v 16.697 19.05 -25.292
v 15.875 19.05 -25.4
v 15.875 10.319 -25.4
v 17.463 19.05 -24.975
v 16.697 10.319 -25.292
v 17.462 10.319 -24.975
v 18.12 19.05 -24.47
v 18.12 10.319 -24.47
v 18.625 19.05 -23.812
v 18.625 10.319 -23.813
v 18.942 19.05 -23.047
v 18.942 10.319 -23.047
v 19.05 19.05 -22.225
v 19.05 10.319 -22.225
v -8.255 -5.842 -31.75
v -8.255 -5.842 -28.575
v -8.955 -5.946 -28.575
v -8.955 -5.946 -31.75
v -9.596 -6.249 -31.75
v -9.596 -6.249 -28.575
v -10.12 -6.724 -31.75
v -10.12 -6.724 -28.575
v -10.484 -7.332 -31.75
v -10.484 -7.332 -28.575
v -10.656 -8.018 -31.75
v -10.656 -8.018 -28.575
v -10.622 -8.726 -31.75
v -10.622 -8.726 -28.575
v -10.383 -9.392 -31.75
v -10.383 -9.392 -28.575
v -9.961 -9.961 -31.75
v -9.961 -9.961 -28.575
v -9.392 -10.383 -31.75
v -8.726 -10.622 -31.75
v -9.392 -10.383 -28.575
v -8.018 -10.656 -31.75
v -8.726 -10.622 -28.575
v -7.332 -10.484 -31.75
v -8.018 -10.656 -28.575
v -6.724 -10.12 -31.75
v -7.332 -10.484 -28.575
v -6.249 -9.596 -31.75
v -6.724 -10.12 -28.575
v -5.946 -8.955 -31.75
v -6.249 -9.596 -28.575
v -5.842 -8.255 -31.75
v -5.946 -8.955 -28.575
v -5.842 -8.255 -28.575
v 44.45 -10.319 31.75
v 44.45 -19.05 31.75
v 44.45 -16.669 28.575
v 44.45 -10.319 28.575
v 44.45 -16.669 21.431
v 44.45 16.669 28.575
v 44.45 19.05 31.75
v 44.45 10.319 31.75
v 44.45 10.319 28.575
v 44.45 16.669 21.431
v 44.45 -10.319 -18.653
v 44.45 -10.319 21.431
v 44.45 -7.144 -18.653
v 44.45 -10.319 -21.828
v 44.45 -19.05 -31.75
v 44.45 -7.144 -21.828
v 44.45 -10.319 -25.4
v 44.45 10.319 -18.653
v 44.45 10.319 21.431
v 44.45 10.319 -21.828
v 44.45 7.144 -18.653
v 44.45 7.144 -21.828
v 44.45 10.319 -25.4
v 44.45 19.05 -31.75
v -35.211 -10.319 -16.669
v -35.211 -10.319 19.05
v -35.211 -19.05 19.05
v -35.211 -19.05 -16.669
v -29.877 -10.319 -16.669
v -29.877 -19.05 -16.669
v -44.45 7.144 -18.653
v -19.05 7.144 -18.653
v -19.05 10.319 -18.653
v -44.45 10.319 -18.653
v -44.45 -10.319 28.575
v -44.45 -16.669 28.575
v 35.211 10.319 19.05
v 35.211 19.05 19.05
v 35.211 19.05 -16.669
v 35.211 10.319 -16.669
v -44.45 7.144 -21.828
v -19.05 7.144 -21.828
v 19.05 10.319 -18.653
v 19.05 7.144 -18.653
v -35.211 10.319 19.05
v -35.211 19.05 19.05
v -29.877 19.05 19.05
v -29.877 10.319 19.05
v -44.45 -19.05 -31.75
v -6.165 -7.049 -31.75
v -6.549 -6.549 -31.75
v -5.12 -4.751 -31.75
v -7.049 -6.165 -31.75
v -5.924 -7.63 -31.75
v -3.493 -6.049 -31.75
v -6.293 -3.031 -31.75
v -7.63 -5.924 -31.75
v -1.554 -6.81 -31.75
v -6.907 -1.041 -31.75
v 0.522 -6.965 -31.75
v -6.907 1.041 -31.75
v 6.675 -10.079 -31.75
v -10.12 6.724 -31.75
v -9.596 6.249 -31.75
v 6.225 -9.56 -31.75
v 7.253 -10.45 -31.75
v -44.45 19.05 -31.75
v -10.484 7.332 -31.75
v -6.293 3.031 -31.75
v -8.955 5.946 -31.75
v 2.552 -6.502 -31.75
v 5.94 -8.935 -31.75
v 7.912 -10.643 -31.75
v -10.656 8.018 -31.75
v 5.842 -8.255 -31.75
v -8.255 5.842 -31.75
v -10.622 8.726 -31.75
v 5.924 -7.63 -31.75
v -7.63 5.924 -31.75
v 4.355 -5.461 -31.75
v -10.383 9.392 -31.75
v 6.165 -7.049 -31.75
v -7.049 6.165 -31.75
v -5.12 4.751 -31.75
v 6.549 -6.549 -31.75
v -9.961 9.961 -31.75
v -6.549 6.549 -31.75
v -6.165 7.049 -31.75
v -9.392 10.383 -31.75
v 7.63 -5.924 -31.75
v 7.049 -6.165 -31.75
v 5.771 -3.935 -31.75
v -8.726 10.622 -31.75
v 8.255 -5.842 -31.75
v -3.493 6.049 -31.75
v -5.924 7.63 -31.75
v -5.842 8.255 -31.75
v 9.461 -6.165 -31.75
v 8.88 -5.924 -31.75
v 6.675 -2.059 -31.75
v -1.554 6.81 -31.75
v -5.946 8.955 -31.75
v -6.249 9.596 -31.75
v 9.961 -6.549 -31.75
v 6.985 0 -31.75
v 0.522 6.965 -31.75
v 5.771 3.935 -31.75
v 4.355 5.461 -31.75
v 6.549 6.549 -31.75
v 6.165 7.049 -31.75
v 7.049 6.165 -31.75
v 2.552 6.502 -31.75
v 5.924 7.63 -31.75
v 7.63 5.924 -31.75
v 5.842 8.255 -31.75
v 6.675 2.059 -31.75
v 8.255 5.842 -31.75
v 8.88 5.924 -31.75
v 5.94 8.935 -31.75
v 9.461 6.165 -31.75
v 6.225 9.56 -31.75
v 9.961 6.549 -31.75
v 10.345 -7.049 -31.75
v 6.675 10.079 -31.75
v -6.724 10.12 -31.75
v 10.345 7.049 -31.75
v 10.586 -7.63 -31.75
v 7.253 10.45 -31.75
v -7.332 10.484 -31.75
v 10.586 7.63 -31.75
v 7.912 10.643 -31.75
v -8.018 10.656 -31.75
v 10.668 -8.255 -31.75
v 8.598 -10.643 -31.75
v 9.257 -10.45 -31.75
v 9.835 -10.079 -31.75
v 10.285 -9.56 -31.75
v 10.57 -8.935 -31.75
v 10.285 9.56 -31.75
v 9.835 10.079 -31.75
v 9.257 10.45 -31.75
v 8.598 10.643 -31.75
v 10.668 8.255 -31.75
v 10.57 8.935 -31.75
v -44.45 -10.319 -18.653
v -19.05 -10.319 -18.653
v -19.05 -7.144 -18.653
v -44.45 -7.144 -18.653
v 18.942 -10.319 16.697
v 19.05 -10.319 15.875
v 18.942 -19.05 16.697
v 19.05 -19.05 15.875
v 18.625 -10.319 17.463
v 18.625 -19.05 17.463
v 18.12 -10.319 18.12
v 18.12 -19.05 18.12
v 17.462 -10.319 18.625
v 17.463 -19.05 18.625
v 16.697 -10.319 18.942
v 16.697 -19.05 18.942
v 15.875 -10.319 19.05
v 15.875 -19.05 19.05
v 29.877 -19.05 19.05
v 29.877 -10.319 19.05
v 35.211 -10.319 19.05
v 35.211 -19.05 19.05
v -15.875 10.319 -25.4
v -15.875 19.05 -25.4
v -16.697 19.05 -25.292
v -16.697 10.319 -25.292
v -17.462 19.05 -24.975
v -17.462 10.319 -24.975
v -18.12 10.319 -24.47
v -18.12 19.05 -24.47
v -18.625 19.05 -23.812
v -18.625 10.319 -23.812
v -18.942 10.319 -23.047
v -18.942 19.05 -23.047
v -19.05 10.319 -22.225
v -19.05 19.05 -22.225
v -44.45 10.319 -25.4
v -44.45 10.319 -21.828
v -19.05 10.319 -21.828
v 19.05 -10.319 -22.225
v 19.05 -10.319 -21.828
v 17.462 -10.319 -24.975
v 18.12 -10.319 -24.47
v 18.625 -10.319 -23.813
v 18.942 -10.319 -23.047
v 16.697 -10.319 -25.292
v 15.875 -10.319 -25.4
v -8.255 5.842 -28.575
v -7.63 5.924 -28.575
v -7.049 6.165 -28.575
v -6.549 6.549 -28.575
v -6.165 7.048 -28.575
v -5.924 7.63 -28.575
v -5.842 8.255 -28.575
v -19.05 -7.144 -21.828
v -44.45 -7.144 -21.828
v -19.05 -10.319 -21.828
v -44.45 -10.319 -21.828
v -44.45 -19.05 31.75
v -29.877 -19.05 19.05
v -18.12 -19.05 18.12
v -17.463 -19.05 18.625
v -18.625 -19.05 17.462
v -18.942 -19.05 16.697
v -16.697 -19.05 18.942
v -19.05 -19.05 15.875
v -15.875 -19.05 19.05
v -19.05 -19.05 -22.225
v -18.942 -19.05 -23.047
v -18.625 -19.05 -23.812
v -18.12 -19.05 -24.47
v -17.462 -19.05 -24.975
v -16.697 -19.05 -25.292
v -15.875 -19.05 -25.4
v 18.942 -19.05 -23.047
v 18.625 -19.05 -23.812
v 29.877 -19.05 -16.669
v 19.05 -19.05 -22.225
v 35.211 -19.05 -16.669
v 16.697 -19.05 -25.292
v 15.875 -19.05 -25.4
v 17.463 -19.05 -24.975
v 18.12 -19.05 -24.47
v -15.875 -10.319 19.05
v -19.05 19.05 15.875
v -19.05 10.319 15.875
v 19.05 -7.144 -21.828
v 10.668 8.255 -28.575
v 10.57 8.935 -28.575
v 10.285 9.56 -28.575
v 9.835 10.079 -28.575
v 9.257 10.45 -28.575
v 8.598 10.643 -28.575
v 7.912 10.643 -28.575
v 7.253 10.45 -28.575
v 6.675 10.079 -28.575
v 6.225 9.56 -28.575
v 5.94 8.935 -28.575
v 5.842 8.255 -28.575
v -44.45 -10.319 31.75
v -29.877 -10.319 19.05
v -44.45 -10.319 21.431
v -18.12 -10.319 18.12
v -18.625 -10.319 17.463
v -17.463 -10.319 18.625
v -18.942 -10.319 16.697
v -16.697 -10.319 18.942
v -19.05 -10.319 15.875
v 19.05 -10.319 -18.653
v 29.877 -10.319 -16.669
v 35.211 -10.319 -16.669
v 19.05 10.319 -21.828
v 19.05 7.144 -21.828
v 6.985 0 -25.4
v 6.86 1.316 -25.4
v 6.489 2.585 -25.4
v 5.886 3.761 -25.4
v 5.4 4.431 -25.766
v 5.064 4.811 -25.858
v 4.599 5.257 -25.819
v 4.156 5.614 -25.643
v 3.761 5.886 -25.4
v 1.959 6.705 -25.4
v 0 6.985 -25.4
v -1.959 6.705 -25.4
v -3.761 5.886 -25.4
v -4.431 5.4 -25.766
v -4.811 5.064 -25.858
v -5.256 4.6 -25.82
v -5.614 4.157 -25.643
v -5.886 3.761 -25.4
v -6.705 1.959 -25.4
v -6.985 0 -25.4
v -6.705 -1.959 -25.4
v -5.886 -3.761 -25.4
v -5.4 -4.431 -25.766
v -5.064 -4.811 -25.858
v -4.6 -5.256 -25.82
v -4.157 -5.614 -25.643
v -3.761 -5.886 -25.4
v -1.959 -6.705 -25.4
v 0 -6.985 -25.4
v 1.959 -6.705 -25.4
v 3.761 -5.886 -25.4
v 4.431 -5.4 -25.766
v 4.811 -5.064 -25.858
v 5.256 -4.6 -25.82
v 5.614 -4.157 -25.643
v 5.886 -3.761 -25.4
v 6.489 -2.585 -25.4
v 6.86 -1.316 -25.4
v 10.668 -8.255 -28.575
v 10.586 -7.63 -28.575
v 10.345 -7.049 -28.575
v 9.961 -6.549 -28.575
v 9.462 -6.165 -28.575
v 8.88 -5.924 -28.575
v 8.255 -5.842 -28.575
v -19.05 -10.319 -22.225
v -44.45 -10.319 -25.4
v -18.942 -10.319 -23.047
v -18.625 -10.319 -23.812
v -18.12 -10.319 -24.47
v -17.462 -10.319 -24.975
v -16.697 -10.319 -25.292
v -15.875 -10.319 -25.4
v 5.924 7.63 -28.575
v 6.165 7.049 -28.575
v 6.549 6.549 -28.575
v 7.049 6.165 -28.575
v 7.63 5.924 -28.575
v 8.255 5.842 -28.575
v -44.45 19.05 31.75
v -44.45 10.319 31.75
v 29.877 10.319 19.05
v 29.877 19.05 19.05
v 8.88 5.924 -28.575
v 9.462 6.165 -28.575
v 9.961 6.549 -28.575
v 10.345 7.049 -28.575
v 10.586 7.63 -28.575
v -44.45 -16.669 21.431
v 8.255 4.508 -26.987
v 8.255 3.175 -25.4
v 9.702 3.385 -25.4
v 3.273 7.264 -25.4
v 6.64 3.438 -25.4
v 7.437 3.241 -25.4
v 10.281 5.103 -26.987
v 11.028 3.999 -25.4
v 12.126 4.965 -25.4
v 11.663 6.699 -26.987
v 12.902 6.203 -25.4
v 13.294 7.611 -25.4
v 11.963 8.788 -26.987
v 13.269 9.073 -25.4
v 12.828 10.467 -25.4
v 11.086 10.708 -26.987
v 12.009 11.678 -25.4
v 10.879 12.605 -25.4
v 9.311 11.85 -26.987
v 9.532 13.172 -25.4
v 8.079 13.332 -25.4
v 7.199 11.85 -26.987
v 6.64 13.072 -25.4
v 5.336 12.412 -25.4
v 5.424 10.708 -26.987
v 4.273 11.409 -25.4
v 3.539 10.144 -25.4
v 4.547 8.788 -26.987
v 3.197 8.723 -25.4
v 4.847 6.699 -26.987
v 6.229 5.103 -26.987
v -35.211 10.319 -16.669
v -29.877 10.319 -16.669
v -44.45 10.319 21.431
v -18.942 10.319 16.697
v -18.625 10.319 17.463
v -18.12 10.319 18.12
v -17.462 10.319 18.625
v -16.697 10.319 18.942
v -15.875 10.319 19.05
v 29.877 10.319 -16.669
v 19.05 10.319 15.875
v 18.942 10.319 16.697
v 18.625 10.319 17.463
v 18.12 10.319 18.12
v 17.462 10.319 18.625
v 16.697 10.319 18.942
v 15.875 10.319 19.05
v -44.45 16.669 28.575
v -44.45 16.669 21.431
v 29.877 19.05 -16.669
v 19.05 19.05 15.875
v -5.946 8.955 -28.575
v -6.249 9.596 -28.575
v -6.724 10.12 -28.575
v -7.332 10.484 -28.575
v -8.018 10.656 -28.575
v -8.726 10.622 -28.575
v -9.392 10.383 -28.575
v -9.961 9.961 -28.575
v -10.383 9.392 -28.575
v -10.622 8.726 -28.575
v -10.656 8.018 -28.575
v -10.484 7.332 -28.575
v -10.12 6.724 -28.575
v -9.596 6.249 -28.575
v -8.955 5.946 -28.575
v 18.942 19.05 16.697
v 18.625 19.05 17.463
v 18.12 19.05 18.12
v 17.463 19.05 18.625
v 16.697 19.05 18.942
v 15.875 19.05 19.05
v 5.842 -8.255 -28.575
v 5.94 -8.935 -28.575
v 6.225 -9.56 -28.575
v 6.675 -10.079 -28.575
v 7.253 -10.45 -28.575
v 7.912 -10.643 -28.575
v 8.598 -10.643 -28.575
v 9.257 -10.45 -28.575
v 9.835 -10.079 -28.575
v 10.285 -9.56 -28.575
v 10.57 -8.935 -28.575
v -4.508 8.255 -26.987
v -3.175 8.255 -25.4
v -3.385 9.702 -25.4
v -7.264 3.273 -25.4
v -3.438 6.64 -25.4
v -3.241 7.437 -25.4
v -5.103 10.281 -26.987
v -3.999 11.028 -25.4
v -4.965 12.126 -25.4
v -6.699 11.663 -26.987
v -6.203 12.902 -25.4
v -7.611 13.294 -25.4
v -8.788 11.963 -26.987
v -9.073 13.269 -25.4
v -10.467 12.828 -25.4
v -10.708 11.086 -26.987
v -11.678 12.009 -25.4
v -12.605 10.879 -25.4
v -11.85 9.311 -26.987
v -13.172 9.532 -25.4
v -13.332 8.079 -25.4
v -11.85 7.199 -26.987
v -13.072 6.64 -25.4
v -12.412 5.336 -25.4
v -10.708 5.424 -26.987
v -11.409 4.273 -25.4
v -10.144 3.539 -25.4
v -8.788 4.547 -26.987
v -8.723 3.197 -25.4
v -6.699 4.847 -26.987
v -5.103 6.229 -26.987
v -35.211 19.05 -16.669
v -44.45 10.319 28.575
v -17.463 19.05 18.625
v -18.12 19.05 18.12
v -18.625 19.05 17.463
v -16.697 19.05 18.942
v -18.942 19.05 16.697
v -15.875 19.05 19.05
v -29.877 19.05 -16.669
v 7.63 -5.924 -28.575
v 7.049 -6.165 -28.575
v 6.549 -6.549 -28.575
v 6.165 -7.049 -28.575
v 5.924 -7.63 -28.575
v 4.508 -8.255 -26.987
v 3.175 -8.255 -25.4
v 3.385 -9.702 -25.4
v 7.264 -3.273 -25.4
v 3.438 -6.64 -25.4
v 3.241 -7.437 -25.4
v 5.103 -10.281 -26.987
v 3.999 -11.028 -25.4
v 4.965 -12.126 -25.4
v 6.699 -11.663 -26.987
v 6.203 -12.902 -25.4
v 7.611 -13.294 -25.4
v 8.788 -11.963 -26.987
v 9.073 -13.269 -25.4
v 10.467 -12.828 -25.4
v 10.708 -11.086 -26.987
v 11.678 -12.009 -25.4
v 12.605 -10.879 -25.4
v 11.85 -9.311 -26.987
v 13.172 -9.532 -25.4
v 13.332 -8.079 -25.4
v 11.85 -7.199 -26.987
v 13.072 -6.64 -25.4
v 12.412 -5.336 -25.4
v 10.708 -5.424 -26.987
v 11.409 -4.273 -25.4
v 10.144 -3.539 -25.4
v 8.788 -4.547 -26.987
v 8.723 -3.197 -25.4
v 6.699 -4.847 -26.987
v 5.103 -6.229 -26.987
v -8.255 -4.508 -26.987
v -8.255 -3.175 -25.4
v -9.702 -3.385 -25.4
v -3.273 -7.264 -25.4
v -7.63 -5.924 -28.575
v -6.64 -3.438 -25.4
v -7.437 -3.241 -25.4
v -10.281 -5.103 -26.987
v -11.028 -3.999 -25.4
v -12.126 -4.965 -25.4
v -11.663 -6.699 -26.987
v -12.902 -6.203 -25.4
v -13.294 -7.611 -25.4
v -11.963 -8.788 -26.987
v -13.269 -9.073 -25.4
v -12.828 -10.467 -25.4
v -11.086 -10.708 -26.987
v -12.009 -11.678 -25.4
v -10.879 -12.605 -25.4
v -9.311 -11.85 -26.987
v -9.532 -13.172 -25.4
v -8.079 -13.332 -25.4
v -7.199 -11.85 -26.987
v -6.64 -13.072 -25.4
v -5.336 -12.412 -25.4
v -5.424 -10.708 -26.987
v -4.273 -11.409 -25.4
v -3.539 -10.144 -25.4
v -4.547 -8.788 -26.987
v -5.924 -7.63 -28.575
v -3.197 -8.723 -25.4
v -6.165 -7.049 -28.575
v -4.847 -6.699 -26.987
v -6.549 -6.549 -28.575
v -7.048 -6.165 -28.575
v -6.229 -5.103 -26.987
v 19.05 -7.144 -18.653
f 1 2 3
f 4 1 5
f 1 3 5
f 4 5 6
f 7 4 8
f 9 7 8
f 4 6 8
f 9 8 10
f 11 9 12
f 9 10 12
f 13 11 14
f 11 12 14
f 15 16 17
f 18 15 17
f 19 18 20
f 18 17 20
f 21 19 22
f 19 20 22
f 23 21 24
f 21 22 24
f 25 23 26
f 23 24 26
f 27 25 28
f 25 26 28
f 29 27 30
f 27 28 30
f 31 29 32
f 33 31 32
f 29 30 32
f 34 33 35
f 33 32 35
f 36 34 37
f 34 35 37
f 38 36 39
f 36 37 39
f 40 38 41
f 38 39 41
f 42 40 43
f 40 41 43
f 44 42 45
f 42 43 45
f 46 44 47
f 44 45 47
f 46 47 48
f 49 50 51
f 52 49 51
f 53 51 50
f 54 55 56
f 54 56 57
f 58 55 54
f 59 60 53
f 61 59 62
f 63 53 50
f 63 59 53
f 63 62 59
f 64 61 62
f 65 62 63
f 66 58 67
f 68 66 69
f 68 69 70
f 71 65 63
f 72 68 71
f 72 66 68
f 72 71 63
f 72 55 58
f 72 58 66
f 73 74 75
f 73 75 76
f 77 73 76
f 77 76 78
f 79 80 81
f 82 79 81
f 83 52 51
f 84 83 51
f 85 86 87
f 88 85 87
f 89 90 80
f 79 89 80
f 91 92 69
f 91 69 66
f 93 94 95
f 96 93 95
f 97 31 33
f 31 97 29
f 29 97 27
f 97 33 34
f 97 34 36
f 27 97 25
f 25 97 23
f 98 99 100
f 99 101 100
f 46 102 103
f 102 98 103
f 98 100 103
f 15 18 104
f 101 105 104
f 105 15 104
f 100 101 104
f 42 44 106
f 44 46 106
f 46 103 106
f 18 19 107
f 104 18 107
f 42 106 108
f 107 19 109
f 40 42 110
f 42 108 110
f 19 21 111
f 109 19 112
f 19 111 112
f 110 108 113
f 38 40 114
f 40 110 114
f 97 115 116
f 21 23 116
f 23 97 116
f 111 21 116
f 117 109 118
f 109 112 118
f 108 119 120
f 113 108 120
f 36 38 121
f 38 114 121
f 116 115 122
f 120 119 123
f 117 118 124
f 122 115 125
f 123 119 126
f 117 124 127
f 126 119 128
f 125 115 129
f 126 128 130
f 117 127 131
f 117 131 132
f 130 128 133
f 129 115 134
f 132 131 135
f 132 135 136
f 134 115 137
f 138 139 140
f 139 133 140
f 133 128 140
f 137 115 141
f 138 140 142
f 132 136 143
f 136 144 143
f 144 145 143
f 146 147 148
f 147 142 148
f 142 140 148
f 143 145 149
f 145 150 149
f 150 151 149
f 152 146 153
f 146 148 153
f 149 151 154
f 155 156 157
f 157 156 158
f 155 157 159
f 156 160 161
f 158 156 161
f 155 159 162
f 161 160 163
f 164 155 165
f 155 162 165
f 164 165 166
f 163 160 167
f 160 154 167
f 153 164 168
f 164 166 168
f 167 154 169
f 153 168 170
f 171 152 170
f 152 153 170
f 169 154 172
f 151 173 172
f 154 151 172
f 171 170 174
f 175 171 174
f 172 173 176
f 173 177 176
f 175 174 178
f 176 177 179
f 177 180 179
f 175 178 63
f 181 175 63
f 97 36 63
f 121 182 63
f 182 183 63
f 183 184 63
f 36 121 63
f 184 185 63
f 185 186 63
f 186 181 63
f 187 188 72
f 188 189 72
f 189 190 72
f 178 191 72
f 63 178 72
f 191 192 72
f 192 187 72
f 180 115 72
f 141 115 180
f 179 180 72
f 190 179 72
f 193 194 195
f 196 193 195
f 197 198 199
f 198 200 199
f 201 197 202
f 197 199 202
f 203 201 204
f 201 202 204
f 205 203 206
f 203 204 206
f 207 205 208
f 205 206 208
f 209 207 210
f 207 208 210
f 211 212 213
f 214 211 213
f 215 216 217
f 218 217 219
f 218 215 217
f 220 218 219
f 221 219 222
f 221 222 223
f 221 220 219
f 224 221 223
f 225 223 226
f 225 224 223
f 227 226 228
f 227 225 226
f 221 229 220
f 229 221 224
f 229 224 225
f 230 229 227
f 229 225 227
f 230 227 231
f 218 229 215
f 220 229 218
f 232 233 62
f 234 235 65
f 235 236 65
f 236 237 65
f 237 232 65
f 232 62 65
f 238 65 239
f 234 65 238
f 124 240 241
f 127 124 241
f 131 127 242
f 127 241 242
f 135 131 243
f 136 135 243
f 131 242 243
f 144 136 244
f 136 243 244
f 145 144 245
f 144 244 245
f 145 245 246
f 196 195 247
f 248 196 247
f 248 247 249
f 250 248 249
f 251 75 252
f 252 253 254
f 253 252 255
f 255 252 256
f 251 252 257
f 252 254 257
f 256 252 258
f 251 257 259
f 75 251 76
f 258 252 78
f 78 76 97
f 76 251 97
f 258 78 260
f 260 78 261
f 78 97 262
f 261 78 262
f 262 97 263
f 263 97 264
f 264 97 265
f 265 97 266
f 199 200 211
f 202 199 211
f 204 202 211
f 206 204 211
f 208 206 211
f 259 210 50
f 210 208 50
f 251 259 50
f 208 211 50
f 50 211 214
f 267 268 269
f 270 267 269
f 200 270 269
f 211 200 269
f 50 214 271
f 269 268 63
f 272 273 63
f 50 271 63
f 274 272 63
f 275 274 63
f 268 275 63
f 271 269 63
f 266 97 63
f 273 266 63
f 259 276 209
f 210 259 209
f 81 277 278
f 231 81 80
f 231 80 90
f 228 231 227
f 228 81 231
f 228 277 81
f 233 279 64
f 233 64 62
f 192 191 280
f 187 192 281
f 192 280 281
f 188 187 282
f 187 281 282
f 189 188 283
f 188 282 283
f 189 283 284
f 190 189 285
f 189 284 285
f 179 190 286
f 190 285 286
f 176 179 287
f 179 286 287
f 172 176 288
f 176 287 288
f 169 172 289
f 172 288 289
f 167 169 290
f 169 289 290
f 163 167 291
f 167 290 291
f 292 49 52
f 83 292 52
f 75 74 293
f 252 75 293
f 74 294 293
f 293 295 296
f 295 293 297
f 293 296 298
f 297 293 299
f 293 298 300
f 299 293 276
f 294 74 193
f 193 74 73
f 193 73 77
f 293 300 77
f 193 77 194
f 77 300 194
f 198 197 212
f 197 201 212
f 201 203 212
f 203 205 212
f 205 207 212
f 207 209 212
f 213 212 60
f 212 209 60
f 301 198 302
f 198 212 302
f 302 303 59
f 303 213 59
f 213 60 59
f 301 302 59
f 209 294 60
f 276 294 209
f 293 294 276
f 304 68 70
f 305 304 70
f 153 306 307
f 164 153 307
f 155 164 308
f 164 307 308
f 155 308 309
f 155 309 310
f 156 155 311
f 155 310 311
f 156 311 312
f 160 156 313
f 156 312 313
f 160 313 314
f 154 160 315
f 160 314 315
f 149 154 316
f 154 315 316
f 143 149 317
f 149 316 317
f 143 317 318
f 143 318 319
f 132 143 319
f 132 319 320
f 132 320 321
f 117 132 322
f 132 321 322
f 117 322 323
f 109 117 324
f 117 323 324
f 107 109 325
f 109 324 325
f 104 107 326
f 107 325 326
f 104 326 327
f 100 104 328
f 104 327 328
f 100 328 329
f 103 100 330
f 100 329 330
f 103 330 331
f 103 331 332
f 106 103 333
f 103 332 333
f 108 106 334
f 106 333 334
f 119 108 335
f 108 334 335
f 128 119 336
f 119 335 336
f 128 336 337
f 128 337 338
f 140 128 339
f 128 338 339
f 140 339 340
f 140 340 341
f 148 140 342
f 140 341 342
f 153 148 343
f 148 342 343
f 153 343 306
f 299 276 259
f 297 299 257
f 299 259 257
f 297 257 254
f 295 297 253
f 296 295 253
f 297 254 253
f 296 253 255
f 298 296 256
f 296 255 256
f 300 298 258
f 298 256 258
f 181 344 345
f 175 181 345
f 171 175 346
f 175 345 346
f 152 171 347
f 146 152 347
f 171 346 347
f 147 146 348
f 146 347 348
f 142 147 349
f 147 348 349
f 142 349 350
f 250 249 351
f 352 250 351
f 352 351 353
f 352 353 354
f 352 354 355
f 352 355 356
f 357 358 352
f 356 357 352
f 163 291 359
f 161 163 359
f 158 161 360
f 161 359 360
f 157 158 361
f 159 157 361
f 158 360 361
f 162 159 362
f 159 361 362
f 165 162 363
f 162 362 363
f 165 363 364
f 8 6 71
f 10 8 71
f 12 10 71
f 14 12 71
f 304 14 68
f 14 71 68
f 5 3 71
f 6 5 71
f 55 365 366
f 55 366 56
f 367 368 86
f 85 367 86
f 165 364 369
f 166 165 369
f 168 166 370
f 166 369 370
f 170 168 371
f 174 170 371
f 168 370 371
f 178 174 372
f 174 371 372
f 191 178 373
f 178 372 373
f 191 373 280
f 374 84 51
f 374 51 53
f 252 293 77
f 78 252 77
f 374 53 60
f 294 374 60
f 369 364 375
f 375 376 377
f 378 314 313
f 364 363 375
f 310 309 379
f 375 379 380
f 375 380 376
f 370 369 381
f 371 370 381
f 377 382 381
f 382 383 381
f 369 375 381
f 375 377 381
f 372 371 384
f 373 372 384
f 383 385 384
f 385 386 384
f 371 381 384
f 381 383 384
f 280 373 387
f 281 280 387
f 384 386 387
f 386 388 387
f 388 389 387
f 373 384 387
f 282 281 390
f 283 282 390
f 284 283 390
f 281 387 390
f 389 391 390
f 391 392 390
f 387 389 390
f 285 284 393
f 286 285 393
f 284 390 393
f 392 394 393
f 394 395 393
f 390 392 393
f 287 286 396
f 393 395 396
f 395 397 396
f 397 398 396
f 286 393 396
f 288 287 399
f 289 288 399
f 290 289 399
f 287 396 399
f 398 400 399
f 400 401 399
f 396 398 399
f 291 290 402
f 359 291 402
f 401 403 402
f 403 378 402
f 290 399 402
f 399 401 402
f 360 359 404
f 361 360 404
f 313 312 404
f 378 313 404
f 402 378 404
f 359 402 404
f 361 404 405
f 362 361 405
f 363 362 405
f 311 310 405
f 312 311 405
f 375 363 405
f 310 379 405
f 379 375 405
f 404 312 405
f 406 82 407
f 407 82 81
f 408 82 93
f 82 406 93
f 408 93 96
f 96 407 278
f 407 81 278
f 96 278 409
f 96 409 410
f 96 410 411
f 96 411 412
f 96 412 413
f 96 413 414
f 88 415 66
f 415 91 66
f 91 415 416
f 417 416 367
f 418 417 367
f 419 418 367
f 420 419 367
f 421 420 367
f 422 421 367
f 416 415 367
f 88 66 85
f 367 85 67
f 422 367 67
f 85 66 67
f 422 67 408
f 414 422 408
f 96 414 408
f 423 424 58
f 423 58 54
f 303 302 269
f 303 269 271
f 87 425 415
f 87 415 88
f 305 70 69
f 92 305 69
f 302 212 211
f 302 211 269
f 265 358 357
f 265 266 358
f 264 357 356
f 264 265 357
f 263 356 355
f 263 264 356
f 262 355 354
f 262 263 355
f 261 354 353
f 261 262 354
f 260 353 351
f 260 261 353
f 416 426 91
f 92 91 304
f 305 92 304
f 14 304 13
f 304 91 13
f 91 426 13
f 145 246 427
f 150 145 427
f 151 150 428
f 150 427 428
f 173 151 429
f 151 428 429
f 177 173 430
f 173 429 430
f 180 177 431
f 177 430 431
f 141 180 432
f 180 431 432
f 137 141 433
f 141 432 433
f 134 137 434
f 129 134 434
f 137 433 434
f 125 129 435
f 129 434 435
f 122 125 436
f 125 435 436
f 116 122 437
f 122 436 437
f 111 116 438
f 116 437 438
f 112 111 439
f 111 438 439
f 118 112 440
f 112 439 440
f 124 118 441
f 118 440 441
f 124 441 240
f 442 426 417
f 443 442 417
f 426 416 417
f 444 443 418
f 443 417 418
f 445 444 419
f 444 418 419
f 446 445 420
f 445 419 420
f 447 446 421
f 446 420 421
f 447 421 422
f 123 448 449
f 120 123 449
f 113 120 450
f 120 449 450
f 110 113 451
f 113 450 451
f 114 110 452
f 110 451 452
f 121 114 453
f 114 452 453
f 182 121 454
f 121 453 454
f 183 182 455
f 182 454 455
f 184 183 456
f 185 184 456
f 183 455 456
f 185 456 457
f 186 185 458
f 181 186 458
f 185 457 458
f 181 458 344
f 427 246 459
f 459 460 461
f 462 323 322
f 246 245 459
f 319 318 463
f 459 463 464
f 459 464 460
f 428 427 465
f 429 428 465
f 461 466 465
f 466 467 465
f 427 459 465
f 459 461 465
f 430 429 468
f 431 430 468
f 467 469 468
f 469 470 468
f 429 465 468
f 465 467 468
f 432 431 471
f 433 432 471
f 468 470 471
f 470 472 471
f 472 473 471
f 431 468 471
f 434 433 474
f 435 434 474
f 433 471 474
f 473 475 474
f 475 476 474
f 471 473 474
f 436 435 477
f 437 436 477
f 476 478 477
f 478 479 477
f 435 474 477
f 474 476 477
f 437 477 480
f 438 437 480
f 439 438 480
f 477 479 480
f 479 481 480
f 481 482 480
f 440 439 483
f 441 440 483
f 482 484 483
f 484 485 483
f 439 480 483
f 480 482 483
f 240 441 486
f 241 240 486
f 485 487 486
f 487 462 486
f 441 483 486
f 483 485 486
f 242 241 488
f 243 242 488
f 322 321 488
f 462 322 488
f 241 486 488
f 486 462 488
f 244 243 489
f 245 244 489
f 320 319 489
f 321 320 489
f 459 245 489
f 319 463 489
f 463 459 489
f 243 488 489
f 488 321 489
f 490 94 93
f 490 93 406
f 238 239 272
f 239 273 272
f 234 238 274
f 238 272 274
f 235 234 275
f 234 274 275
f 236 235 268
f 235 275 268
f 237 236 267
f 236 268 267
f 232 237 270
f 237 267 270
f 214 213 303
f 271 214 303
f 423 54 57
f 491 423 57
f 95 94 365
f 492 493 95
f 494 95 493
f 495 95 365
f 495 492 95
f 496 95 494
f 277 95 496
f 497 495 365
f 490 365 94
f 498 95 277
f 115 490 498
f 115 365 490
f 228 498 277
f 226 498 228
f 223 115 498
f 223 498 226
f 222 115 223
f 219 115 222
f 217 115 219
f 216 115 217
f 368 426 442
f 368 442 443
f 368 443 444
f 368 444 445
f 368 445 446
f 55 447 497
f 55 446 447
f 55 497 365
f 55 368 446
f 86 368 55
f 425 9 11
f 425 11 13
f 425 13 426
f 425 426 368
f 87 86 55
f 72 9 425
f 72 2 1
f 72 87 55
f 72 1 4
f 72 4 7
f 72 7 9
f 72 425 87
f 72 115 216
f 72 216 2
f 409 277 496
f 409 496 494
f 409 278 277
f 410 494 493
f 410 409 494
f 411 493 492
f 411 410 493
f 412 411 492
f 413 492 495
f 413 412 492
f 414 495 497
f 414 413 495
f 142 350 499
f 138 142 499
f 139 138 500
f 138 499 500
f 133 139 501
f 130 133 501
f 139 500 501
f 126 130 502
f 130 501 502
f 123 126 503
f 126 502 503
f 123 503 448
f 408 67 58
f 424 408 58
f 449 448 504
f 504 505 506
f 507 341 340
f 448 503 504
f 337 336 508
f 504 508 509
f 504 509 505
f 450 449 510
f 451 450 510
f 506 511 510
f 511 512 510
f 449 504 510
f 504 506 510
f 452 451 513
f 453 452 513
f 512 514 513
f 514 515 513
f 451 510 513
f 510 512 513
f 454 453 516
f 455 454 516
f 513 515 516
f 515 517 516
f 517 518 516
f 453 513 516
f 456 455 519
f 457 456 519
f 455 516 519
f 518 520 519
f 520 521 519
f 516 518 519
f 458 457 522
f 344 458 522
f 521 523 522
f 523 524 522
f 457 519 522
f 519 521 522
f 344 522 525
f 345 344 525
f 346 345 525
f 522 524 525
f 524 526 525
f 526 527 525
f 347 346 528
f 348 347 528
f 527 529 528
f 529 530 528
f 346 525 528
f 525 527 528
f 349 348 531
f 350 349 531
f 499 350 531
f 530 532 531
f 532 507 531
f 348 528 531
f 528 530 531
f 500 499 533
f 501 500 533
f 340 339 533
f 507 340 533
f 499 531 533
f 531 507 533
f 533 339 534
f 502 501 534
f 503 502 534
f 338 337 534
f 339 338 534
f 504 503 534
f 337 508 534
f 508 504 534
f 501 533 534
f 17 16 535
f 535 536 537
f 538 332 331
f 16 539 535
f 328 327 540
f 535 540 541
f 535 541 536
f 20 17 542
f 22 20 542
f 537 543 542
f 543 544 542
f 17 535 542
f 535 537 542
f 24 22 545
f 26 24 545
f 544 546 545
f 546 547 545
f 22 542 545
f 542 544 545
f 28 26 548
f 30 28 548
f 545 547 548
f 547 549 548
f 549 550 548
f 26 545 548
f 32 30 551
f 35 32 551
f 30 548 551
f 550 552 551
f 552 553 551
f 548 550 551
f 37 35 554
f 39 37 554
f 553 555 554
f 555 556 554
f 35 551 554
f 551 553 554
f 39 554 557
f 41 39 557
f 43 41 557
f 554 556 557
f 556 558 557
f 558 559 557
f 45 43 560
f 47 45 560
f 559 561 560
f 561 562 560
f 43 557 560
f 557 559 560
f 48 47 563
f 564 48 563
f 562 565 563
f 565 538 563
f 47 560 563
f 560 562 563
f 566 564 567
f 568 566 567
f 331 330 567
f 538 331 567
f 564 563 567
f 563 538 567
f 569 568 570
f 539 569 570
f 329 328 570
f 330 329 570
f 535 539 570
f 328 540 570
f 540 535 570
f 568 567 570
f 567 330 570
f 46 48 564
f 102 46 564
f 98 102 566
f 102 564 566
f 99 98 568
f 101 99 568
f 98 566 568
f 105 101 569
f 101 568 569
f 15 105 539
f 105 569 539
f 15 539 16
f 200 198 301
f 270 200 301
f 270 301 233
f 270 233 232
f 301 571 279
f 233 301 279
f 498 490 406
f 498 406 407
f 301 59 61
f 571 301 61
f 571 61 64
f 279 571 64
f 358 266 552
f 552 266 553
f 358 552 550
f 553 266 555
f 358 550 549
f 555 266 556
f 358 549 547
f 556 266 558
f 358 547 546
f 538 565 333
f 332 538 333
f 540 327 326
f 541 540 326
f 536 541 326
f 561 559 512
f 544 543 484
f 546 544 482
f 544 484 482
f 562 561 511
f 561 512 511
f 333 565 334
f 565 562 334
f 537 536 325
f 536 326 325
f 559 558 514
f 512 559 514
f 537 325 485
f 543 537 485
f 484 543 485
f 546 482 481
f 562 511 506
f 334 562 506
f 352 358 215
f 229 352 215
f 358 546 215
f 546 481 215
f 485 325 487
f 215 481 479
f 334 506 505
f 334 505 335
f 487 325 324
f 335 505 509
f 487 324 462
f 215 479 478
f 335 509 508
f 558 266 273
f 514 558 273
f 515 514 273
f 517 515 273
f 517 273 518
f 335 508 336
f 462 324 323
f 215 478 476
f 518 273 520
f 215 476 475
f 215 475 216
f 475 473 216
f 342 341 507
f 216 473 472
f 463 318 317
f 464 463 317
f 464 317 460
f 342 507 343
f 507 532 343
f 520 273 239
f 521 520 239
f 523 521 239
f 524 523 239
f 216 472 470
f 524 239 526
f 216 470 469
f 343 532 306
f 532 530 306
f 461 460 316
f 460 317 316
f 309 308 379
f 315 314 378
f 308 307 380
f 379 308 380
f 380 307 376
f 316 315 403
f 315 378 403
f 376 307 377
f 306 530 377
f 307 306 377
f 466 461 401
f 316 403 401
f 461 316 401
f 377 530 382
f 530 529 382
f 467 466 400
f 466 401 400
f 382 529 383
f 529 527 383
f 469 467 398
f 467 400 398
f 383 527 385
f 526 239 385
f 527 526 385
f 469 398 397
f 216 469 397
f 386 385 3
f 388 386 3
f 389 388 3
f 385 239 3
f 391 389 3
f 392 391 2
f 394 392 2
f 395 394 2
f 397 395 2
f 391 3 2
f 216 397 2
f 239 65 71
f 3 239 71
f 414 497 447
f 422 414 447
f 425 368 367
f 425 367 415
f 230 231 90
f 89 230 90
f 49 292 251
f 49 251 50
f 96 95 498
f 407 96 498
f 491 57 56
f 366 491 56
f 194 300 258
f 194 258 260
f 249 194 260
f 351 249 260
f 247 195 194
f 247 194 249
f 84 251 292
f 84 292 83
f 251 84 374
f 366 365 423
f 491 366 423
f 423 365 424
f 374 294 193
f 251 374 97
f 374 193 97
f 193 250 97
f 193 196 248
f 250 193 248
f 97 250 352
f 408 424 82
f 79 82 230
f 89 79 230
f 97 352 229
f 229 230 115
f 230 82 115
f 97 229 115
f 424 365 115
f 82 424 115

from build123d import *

# Parameters (mm, degrees)
SKETCH1_W           = 88.9
SKETCH1_H           = 63.5
BOSS_EXTRUDE1_DEPTH = 19.05
CUT_EXTRUDE1_DEPTH  = 97.302518139
SKETCH7_W           = 5.334
SKETCH7_H           = 35.71875
SKETCH7_W_2         = 38.1
SKETCH7_H_2         = 44.45
CUT_EXTRUDE4_DEPTH  = 67.599361859
SKETCH4_R           = 6.985
CUT_EXTRUDE3_DEPTH  = 75.865395878
SKETCH6_R           = 2.413
SKETCH5_R           = 5.08
CIRPATTERN1_COUNT   = 4
FILLET1_R           = 3.175


with BuildPart() as part:
    # Sketch1 → Boss-Extrude1 (new, symmetric)
    with BuildSketch(Plane(origin=(0, 0, 0), x_dir=(1, 0, 0), z_dir=(0, 1, 0))):
        Rectangle(SKETCH1_W, SKETCH1_H)
    extrude(amount=BOSS_EXTRUDE1_DEPTH, both=True)

    # Sketch3 → Cut-Extrude1 (cut, through all)
    with BuildSketch(Plane(origin=(44.45, 0, 0), x_dir=(0, 0, -1), z_dir=(1, 0, 0))):
        Polygon((-31.75, 10.31875), (-31.75, -10.31875), (-28.575, -10.31875), (-28.575, -16.66875), (-21.43125, -16.66875), (-21.43125, -10.31875), (18.653125, -10.31875), (18.653125, -7.14375), (21.828125, -7.14375), (21.828125, -10.31875), (25.4, -10.31875), (25.4, 10.31875), (21.828125, 10.31875), (21.828125, 7.14375), (18.653125, 7.14375), (18.653125, 10.31875), (-21.43125, 10.31875), (-21.43125, 16.66875), (-28.575, 16.66875), (-28.575, 10.31875), align=None)
    extrude(amount=-CUT_EXTRUDE1_DEPTH, mode=Mode.SUBTRACT)

    # Sketch7 → Cut-Extrude4 (cut, through all)
    with BuildSketch(Plane(origin=(0, 19.05, 0), x_dir=(1, 0, 0), z_dir=(0, 1, 0))):
        with Locations((-32.54375, -1.190625)):
            Rectangle(SKETCH7_W, SKETCH7_H)
        with Locations((32.54375, -1.190625)):
            Rectangle(SKETCH7_W, SKETCH7_H)
        with Locations((0, 3.175)):
            Rectangle(SKETCH7_W_2, SKETCH7_H_2)
    extrude(amount=-CUT_EXTRUDE4_DEPTH, mode=Mode.SUBTRACT)

    # Sketch4 → Cut-Extrude3 (cut, through all)
    with BuildSketch(Plane.XY.offset(-25.4)):
        Circle(SKETCH4_R)
        with BuildLine():
            ThreePointArc((-5.842, 8.255), (-9.961248663, 9.961248663), (-8.255, 5.842))
            Line((-8.255, 5.842), (-8.255, 8.255))
            Line((-8.255, 8.255), (-5.842, 8.255))
        make_face()
        with BuildLine():
            Line((-8.255, 8.255), (-8.255, 5.842))
            ThreePointArc((-8.255, 5.842), (-6.548751337, 6.548751337), (-5.842, 8.255))
            Line((-5.842, 8.255), (-8.255, 8.255))
        make_face()
        with BuildLine():
            ThreePointArc((5.842, 8.255), (6.548751337, 6.548751337), (8.255, 5.842))
            Line((8.255, 5.842), (8.255, 8.255))
            Line((8.255, 8.255), (5.842, 8.255))
        make_face()
        with BuildLine():
            Line((8.255, 8.255), (8.255, 5.842))
            ThreePointArc((8.255, 5.842), (9.961248663, 6.548751337), (10.668, 8.255))
            ThreePointArc((10.668, 8.255), (8.255, 10.668), (5.842, 8.255))
            Line((5.842, 8.255), (8.255, 8.255))
        make_face()
        with BuildLine():
            ThreePointArc((8.255, -5.842), (6.548751337, -6.548751337), (5.842, -8.255))
            Line((5.842, -8.255), (8.255, -8.255))
            Line((8.255, -8.255), (8.255, -5.842))
        make_face()
        with BuildLine():
            Line((8.255, -8.255), (5.842, -8.255))
            ThreePointArc((5.842, -8.255), (8.255, -10.668), (10.668, -8.255))
            ThreePointArc((10.668, -8.255), (9.961248663, -6.548751337), (8.255, -5.842))
            Line((8.255, -5.842), (8.255, -8.255))
        make_face()
        with BuildLine():
            ThreePointArc((-8.255, -5.842), (-9.961248663, -9.961248663), (-5.842, -8.255))
            Line((-5.842, -8.255), (-8.255, -8.255))
            Line((-8.255, -8.255), (-8.255, -5.842))
        make_face()
        with BuildLine():
            Line((-8.255, -8.255), (-5.842, -8.255))
            ThreePointArc((-5.842, -8.255), (-6.548751337, -6.548751337), (-8.255, -5.842))
            Line((-8.255, -5.842), (-8.255, -8.255))
        make_face()
    extrude(amount=-CUT_EXTRUDE3_DEPTH, mode=Mode.SUBTRACT)

    # Sketch6 → Cut-Loft2 section 0
    with BuildSketch(Plane.XY.offset(-28.575)):
        with Locations((-8.255, 8.255)):
            Circle(SKETCH6_R)
    # Sketch5 → Cut-Loft2 section 1
    with BuildSketch(Plane.XY.offset(-25.4)):
        with Locations((-8.255, 8.255)):
            Circle(SKETCH5_R)
    cut_loft2 = loft(mode=Mode.SUBTRACT)

    # CirPattern1: Cut-Loft2 ×4 about axis
    cirpattern1_axis = Axis((0, 0, 0), (0, 0, 1))
    for i in range(1, CIRPATTERN1_COUNT):
        add(cut_loft2.rotate(cirpattern1_axis, i * 360 / CIRPATTERN1_COUNT), mode=Mode.SUBTRACT)

    # Fillet1
    fillet1_edges = [part.edges().sort_by_distance(p)[0] for p in [
        (19.05, -14.684375, 19.05),
        (-19.05, -14.684375, 19.05),
        (-19.05, -14.684375, -25.4),
        (19.05, -14.684375, -25.4),
        (-19.05, 14.684375, 19.05),
        (-19.05, 14.684375, -25.4),
        (19.05, 14.684375, -25.4),
        (19.05, 14.684375, 19.05),
    ]]
    fillet(fillet1_edges, radius=FILLET1_R)


solid = part.part
